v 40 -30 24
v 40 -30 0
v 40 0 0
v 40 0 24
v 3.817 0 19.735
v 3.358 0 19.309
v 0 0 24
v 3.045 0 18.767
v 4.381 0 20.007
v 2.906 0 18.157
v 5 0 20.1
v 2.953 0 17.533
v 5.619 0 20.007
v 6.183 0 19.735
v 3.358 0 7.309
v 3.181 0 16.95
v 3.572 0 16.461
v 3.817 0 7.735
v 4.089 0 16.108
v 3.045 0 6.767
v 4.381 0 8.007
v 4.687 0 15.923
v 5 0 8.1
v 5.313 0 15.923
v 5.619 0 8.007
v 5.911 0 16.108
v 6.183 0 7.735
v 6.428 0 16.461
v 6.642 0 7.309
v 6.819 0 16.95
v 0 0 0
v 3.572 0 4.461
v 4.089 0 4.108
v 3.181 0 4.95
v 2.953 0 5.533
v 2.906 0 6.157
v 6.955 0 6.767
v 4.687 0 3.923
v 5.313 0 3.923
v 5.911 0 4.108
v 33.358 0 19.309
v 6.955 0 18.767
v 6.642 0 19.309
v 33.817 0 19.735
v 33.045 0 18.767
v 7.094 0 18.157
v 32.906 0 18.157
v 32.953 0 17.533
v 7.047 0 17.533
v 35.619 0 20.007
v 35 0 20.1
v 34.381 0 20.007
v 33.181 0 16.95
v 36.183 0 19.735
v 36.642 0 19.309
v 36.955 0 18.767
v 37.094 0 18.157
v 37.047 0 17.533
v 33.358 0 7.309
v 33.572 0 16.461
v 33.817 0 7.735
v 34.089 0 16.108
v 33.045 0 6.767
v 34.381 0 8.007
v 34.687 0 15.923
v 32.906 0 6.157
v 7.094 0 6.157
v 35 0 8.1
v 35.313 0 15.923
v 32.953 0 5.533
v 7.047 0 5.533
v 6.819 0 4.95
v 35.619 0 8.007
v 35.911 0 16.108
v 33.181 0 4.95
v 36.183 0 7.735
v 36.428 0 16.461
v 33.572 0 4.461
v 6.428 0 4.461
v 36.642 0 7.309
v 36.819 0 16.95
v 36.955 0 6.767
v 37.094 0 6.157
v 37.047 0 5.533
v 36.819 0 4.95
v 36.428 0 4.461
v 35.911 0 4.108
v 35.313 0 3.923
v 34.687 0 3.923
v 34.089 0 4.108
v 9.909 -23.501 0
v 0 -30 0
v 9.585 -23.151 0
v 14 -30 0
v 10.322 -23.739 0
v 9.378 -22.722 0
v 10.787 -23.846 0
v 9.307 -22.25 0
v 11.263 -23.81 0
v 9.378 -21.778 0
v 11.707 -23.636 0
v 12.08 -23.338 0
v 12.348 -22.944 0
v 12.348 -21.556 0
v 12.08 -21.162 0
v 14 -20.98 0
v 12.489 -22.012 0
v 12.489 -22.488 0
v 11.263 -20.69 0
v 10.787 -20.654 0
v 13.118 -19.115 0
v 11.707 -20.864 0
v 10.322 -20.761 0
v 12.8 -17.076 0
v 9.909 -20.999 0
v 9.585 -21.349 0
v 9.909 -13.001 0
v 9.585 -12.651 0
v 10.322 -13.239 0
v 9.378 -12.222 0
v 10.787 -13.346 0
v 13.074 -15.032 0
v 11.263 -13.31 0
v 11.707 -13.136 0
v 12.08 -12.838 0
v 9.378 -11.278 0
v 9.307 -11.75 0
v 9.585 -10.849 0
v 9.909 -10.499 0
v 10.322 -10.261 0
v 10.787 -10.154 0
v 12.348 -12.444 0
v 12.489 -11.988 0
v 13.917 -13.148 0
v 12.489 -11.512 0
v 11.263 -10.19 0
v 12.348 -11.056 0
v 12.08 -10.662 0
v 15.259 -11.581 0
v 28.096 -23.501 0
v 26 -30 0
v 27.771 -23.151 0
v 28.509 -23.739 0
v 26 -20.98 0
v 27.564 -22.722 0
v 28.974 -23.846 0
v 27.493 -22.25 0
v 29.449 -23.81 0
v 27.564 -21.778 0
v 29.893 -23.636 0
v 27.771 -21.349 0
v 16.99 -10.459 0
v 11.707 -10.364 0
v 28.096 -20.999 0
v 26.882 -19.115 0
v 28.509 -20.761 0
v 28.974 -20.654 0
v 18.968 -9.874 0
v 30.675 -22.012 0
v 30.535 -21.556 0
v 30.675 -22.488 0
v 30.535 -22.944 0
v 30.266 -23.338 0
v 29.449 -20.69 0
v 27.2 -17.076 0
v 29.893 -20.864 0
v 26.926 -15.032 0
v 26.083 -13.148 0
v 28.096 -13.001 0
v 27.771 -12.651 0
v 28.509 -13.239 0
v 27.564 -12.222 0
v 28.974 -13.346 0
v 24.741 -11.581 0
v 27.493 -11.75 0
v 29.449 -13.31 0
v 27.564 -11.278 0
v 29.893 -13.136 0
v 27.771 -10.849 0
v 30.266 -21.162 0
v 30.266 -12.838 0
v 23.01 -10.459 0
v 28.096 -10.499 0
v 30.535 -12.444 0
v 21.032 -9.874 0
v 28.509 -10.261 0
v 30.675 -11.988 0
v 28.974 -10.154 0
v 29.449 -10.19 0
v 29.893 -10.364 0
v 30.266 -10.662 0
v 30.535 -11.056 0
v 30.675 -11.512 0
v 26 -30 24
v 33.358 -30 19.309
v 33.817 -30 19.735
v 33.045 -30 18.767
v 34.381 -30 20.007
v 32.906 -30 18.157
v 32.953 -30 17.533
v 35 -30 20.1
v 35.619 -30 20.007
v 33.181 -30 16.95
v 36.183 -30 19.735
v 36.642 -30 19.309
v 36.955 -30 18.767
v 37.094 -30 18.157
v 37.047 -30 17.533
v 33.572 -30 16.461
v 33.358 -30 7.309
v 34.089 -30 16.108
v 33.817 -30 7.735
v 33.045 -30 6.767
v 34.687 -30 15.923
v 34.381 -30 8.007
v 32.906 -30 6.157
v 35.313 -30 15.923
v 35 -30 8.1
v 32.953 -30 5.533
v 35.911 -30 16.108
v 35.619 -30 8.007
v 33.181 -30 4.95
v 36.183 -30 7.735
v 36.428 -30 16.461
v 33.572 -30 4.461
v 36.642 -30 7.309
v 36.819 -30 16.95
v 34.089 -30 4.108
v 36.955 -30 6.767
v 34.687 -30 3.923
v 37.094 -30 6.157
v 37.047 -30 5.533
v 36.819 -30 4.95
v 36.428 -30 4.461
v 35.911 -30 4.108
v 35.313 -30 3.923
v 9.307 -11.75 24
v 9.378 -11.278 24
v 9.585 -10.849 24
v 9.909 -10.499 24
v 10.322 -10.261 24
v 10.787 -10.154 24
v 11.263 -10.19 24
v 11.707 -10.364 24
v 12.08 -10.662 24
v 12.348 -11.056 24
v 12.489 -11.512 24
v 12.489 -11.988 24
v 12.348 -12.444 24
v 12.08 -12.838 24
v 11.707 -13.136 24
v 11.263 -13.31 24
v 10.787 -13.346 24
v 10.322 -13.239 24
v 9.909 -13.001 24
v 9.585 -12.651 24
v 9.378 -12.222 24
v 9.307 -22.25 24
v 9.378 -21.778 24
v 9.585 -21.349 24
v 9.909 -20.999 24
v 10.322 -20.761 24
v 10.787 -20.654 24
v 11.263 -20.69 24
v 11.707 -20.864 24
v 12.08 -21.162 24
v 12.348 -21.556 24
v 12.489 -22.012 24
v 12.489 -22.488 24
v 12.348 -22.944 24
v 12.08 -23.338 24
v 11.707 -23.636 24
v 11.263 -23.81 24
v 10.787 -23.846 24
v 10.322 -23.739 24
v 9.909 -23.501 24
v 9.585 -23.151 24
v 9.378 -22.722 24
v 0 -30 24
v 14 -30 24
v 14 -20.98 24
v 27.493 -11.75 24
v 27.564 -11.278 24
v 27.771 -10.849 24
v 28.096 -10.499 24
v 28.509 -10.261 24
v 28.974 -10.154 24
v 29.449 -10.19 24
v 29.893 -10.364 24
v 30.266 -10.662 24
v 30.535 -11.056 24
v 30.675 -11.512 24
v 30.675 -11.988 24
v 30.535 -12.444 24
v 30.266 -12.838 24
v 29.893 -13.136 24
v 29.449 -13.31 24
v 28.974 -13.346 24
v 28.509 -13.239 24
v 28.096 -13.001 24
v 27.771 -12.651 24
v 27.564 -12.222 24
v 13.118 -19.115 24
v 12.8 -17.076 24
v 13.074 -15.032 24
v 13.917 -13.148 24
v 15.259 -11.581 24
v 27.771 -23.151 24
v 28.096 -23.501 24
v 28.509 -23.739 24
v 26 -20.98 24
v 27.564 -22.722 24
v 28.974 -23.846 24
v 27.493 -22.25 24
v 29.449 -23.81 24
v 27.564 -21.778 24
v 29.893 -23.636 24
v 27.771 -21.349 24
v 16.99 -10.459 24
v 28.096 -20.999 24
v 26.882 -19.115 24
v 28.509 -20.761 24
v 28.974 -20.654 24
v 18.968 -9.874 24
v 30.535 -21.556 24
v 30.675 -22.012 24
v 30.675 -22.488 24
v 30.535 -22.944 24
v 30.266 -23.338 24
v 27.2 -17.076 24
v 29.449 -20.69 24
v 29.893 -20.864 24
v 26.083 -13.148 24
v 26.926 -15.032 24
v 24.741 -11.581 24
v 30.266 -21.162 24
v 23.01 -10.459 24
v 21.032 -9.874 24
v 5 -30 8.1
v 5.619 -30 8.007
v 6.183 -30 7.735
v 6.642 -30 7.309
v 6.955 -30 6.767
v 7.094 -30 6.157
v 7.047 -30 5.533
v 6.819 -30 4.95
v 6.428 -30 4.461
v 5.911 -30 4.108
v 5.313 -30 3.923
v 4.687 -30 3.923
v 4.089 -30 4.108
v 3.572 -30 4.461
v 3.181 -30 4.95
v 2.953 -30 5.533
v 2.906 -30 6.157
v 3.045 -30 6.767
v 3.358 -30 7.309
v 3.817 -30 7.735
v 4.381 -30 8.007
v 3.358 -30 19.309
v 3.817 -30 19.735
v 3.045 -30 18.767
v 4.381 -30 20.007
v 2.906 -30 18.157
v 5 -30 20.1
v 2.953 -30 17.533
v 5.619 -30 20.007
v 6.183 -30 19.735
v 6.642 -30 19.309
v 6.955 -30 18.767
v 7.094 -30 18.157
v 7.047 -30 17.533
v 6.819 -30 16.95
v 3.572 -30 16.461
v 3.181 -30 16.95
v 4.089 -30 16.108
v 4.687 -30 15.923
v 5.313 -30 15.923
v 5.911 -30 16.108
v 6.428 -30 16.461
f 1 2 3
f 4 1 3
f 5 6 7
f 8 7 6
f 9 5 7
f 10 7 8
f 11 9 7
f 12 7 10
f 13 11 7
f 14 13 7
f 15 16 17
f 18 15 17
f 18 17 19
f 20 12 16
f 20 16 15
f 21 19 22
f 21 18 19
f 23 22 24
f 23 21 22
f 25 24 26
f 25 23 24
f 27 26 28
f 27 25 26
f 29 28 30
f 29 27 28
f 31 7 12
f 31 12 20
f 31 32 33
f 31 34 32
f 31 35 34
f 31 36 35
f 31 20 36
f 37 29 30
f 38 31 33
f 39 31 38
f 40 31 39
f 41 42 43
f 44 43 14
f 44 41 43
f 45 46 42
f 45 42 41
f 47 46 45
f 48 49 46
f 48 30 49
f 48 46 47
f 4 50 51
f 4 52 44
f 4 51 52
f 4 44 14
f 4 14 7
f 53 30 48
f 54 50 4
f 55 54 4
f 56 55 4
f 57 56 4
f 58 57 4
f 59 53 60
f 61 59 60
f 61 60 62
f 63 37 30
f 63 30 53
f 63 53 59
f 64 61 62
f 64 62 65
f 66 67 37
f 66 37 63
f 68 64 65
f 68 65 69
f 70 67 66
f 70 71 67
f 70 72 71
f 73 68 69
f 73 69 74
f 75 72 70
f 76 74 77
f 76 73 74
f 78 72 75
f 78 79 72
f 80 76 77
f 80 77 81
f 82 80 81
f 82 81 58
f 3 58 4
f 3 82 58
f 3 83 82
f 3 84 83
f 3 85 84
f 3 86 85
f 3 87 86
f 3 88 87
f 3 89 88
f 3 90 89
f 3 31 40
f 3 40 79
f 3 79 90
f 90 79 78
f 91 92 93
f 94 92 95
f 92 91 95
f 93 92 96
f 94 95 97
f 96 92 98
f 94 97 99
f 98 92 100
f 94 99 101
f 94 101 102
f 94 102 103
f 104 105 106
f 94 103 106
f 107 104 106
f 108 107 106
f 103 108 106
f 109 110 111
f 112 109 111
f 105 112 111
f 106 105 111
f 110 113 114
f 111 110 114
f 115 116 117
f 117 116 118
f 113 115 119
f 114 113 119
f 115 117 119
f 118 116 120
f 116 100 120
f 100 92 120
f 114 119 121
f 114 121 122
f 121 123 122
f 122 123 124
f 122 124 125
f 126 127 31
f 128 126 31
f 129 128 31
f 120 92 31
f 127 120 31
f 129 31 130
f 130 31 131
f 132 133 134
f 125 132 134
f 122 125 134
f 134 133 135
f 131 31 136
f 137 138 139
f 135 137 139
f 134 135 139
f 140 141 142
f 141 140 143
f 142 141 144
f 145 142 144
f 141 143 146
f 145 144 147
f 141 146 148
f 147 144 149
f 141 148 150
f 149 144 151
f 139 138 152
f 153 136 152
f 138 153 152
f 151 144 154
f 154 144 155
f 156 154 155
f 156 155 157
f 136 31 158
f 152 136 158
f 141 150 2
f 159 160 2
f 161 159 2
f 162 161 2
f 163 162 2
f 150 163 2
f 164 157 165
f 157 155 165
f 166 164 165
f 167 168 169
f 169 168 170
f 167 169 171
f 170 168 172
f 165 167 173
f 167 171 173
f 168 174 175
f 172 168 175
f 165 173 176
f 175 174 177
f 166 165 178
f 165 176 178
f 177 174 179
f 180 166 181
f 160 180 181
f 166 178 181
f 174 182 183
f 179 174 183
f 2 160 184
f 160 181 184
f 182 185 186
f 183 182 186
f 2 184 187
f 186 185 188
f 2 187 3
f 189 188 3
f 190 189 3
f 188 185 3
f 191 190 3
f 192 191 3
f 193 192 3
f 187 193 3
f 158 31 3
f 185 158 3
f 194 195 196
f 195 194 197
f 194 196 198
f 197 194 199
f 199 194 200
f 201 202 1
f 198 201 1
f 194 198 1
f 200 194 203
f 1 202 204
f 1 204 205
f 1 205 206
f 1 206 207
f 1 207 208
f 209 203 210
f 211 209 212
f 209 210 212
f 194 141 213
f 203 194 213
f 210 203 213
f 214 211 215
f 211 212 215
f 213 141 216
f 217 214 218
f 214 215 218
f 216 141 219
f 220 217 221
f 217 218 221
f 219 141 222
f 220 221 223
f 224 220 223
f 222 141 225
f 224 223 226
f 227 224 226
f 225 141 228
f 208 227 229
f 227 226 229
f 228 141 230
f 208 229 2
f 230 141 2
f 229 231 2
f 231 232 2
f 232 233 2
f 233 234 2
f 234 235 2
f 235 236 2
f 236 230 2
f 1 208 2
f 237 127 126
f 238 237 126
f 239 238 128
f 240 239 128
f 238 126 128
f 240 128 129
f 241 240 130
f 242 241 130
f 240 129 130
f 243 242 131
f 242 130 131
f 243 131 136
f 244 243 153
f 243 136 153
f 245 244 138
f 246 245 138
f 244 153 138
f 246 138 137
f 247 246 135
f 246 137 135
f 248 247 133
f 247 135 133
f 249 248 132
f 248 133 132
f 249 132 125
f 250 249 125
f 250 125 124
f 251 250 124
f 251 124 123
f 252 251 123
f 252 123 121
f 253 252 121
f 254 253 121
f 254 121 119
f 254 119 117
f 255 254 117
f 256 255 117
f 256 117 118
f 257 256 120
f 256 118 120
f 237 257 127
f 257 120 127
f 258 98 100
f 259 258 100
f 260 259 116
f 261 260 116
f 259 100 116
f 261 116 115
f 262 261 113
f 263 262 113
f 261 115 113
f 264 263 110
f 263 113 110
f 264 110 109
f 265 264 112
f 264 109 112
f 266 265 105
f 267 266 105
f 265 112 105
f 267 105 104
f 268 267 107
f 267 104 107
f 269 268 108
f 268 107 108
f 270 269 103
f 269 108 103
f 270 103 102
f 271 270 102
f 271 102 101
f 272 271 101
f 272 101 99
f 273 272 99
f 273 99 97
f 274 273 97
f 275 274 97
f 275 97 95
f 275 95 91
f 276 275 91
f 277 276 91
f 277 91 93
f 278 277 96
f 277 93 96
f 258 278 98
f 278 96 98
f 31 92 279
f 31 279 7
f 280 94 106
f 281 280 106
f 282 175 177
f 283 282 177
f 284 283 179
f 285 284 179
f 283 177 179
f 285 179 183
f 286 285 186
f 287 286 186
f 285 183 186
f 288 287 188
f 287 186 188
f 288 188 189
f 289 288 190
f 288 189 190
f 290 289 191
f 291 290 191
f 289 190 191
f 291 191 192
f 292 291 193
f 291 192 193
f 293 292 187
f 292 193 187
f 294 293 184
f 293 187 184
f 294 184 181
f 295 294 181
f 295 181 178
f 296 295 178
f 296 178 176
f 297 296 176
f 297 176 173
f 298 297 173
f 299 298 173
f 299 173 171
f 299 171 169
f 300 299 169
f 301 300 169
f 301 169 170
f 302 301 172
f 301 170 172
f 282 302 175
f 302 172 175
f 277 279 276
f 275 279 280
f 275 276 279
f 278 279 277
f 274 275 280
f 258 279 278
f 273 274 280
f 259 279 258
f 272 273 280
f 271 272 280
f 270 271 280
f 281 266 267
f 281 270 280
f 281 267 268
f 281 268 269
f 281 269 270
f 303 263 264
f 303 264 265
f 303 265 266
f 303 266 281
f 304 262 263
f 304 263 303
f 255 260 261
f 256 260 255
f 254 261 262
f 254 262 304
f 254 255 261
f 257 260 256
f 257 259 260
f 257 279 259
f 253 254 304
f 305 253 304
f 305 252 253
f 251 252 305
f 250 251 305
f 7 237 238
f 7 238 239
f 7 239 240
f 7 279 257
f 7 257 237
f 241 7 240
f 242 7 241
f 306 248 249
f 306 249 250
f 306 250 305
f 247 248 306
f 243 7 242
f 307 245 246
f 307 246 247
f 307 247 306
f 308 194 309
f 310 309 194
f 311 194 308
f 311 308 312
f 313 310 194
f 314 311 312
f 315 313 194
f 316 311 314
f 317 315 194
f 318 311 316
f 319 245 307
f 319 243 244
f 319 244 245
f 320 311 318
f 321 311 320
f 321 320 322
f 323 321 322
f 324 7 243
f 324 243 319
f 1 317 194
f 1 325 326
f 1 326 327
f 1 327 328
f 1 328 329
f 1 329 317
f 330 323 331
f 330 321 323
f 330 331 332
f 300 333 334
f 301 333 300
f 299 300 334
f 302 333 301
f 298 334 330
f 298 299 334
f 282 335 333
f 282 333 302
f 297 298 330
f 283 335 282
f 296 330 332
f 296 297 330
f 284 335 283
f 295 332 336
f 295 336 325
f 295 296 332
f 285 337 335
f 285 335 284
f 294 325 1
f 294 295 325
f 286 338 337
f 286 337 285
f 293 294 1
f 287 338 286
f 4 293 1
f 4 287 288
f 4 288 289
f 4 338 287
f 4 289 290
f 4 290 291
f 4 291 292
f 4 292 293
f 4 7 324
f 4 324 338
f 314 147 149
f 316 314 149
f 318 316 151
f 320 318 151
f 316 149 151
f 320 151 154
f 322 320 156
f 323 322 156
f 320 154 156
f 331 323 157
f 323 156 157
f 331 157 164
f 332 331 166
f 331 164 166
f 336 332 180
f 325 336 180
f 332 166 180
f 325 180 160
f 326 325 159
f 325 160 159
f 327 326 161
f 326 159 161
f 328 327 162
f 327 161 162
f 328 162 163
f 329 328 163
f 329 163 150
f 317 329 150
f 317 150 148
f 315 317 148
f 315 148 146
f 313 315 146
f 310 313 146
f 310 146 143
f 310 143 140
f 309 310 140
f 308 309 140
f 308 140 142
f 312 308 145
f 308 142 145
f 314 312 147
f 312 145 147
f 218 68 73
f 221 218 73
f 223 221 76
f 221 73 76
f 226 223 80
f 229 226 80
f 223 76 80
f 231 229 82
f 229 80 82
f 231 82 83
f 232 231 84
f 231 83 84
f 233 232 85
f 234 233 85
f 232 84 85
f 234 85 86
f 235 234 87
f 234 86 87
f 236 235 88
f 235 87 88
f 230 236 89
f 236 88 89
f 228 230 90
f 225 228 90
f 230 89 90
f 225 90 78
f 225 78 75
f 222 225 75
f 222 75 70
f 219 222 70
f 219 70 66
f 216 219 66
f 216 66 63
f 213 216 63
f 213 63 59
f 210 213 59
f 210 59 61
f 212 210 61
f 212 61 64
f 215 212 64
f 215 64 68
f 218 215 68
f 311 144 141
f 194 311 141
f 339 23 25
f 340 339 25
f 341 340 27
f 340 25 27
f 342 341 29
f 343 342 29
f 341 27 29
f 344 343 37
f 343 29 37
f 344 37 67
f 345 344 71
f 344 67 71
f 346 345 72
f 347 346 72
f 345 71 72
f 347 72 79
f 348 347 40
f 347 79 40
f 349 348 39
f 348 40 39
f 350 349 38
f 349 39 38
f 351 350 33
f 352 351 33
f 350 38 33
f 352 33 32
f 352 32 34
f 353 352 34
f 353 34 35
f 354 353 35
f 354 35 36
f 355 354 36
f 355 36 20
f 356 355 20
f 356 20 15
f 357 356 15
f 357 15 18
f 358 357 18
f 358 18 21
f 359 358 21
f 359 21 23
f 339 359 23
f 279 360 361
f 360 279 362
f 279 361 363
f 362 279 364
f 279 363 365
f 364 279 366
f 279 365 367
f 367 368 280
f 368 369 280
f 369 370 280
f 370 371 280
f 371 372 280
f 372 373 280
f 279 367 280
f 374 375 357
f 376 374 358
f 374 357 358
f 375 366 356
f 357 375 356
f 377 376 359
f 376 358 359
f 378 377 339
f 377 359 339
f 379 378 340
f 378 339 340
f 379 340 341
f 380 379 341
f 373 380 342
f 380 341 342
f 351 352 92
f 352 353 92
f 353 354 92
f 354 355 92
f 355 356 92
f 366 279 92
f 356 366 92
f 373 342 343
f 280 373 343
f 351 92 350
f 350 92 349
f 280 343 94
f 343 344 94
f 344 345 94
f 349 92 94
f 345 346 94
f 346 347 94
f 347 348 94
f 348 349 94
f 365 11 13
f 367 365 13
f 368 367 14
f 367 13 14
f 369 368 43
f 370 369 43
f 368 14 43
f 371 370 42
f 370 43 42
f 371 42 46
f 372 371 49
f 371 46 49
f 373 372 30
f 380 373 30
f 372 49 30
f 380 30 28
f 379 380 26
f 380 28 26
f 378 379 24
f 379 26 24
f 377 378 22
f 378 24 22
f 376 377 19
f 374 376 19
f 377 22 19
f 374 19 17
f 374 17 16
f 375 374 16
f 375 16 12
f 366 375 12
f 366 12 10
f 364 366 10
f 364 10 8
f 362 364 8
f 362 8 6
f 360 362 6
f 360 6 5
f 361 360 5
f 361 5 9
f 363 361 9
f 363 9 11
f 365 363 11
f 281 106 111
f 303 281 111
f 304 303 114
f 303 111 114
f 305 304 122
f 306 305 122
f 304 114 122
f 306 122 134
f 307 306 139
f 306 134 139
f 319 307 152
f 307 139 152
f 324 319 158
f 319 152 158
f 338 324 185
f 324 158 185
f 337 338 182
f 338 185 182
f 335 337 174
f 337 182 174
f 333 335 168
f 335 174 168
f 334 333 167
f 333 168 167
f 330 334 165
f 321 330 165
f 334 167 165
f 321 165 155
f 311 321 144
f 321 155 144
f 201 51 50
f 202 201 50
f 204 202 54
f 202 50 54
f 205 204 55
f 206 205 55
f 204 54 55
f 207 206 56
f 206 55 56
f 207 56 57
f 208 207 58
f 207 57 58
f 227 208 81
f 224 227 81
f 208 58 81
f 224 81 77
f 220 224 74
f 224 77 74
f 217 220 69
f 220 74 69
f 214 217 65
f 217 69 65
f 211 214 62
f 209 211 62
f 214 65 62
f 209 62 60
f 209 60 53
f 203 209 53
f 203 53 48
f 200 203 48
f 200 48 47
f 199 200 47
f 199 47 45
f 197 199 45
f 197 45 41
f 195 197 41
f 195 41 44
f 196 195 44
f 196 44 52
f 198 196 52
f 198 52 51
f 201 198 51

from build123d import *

# Parameters (mm, degrees)
SKETCH_1_W          = 40
SKETCH_1_H          = 30
EXTRUDE_1_DEPTH     = 24
SKETCH_2_R          = 1.6
CUT_EXTRUDE_1_DEPTH = 24
SKETCH_3_R          = 2.1
CUT_EXTRUDE_2_DEPTH = 34


with BuildPart() as part:
    # 草图1 → 凸台-拉伸1 (new body)
    with BuildSketch(Plane.XY):
        with Locations((20, -15)):
            Rectangle(SKETCH_1_W, SKETCH_1_H)
    extrude(amount=EXTRUDE_1_DEPTH)

    # 草图2 → 切除-拉伸1 (cut)
    with BuildSketch(Plane(origin=(0, 0, 0), x_dir=(-1, 0, 0), z_dir=(0, 0, -1))):
        with BuildLine():
            ThreePointArc((-14, -20.979949748), (-20, -9.8), (-26, -20.979949748))
            Line((-26, -20.979949748), (-26, -30))
            Line((-26, -30), (-20, -30))
            Line((-20, -30), (-14, -30))
            Line((-14, -30), (-14, -20.979949748))
        make_face()
        with Locations((-10.90673326, -11.75)):
            Circle(SKETCH_2_R)
        with Locations((-10.90673326, -22.25)):
            Circle(SKETCH_2_R)
        with Locations((-29.09326674, -22.25)):
            Circle(SKETCH_2_R)
        with Locations((-29.09326674, -11.75)):
            Circle(SKETCH_2_R)
    extrude(amount=-CUT_EXTRUDE_1_DEPTH, mode=Mode.SUBTRACT)

    # 草图3 → 切除-拉伸2 (cut)
    with BuildSketch(Plane(origin=(0, 0, 0), x_dir=(1, 0, 0), z_dir=(0, 1, 0))):
        with Locations(Location((5, -6, 0), (0, 0, 270))):
            Circle(SKETCH_3_R)
        with Locations(Location((35, -6, 0), (0, 0, 270))):
            Circle(SKETCH_3_R)
        with Locations(Location((5, -18, 0), (0, 0, 270))):
            Circle(SKETCH_3_R)
        with Locations(Location((35, -18, 0), (0, 0, 270))):
            Circle(SKETCH_3_R)
    extrude(amount=-CUT_EXTRUDE_2_DEPTH, mode=Mode.SUBTRACT)


solid = part.part
